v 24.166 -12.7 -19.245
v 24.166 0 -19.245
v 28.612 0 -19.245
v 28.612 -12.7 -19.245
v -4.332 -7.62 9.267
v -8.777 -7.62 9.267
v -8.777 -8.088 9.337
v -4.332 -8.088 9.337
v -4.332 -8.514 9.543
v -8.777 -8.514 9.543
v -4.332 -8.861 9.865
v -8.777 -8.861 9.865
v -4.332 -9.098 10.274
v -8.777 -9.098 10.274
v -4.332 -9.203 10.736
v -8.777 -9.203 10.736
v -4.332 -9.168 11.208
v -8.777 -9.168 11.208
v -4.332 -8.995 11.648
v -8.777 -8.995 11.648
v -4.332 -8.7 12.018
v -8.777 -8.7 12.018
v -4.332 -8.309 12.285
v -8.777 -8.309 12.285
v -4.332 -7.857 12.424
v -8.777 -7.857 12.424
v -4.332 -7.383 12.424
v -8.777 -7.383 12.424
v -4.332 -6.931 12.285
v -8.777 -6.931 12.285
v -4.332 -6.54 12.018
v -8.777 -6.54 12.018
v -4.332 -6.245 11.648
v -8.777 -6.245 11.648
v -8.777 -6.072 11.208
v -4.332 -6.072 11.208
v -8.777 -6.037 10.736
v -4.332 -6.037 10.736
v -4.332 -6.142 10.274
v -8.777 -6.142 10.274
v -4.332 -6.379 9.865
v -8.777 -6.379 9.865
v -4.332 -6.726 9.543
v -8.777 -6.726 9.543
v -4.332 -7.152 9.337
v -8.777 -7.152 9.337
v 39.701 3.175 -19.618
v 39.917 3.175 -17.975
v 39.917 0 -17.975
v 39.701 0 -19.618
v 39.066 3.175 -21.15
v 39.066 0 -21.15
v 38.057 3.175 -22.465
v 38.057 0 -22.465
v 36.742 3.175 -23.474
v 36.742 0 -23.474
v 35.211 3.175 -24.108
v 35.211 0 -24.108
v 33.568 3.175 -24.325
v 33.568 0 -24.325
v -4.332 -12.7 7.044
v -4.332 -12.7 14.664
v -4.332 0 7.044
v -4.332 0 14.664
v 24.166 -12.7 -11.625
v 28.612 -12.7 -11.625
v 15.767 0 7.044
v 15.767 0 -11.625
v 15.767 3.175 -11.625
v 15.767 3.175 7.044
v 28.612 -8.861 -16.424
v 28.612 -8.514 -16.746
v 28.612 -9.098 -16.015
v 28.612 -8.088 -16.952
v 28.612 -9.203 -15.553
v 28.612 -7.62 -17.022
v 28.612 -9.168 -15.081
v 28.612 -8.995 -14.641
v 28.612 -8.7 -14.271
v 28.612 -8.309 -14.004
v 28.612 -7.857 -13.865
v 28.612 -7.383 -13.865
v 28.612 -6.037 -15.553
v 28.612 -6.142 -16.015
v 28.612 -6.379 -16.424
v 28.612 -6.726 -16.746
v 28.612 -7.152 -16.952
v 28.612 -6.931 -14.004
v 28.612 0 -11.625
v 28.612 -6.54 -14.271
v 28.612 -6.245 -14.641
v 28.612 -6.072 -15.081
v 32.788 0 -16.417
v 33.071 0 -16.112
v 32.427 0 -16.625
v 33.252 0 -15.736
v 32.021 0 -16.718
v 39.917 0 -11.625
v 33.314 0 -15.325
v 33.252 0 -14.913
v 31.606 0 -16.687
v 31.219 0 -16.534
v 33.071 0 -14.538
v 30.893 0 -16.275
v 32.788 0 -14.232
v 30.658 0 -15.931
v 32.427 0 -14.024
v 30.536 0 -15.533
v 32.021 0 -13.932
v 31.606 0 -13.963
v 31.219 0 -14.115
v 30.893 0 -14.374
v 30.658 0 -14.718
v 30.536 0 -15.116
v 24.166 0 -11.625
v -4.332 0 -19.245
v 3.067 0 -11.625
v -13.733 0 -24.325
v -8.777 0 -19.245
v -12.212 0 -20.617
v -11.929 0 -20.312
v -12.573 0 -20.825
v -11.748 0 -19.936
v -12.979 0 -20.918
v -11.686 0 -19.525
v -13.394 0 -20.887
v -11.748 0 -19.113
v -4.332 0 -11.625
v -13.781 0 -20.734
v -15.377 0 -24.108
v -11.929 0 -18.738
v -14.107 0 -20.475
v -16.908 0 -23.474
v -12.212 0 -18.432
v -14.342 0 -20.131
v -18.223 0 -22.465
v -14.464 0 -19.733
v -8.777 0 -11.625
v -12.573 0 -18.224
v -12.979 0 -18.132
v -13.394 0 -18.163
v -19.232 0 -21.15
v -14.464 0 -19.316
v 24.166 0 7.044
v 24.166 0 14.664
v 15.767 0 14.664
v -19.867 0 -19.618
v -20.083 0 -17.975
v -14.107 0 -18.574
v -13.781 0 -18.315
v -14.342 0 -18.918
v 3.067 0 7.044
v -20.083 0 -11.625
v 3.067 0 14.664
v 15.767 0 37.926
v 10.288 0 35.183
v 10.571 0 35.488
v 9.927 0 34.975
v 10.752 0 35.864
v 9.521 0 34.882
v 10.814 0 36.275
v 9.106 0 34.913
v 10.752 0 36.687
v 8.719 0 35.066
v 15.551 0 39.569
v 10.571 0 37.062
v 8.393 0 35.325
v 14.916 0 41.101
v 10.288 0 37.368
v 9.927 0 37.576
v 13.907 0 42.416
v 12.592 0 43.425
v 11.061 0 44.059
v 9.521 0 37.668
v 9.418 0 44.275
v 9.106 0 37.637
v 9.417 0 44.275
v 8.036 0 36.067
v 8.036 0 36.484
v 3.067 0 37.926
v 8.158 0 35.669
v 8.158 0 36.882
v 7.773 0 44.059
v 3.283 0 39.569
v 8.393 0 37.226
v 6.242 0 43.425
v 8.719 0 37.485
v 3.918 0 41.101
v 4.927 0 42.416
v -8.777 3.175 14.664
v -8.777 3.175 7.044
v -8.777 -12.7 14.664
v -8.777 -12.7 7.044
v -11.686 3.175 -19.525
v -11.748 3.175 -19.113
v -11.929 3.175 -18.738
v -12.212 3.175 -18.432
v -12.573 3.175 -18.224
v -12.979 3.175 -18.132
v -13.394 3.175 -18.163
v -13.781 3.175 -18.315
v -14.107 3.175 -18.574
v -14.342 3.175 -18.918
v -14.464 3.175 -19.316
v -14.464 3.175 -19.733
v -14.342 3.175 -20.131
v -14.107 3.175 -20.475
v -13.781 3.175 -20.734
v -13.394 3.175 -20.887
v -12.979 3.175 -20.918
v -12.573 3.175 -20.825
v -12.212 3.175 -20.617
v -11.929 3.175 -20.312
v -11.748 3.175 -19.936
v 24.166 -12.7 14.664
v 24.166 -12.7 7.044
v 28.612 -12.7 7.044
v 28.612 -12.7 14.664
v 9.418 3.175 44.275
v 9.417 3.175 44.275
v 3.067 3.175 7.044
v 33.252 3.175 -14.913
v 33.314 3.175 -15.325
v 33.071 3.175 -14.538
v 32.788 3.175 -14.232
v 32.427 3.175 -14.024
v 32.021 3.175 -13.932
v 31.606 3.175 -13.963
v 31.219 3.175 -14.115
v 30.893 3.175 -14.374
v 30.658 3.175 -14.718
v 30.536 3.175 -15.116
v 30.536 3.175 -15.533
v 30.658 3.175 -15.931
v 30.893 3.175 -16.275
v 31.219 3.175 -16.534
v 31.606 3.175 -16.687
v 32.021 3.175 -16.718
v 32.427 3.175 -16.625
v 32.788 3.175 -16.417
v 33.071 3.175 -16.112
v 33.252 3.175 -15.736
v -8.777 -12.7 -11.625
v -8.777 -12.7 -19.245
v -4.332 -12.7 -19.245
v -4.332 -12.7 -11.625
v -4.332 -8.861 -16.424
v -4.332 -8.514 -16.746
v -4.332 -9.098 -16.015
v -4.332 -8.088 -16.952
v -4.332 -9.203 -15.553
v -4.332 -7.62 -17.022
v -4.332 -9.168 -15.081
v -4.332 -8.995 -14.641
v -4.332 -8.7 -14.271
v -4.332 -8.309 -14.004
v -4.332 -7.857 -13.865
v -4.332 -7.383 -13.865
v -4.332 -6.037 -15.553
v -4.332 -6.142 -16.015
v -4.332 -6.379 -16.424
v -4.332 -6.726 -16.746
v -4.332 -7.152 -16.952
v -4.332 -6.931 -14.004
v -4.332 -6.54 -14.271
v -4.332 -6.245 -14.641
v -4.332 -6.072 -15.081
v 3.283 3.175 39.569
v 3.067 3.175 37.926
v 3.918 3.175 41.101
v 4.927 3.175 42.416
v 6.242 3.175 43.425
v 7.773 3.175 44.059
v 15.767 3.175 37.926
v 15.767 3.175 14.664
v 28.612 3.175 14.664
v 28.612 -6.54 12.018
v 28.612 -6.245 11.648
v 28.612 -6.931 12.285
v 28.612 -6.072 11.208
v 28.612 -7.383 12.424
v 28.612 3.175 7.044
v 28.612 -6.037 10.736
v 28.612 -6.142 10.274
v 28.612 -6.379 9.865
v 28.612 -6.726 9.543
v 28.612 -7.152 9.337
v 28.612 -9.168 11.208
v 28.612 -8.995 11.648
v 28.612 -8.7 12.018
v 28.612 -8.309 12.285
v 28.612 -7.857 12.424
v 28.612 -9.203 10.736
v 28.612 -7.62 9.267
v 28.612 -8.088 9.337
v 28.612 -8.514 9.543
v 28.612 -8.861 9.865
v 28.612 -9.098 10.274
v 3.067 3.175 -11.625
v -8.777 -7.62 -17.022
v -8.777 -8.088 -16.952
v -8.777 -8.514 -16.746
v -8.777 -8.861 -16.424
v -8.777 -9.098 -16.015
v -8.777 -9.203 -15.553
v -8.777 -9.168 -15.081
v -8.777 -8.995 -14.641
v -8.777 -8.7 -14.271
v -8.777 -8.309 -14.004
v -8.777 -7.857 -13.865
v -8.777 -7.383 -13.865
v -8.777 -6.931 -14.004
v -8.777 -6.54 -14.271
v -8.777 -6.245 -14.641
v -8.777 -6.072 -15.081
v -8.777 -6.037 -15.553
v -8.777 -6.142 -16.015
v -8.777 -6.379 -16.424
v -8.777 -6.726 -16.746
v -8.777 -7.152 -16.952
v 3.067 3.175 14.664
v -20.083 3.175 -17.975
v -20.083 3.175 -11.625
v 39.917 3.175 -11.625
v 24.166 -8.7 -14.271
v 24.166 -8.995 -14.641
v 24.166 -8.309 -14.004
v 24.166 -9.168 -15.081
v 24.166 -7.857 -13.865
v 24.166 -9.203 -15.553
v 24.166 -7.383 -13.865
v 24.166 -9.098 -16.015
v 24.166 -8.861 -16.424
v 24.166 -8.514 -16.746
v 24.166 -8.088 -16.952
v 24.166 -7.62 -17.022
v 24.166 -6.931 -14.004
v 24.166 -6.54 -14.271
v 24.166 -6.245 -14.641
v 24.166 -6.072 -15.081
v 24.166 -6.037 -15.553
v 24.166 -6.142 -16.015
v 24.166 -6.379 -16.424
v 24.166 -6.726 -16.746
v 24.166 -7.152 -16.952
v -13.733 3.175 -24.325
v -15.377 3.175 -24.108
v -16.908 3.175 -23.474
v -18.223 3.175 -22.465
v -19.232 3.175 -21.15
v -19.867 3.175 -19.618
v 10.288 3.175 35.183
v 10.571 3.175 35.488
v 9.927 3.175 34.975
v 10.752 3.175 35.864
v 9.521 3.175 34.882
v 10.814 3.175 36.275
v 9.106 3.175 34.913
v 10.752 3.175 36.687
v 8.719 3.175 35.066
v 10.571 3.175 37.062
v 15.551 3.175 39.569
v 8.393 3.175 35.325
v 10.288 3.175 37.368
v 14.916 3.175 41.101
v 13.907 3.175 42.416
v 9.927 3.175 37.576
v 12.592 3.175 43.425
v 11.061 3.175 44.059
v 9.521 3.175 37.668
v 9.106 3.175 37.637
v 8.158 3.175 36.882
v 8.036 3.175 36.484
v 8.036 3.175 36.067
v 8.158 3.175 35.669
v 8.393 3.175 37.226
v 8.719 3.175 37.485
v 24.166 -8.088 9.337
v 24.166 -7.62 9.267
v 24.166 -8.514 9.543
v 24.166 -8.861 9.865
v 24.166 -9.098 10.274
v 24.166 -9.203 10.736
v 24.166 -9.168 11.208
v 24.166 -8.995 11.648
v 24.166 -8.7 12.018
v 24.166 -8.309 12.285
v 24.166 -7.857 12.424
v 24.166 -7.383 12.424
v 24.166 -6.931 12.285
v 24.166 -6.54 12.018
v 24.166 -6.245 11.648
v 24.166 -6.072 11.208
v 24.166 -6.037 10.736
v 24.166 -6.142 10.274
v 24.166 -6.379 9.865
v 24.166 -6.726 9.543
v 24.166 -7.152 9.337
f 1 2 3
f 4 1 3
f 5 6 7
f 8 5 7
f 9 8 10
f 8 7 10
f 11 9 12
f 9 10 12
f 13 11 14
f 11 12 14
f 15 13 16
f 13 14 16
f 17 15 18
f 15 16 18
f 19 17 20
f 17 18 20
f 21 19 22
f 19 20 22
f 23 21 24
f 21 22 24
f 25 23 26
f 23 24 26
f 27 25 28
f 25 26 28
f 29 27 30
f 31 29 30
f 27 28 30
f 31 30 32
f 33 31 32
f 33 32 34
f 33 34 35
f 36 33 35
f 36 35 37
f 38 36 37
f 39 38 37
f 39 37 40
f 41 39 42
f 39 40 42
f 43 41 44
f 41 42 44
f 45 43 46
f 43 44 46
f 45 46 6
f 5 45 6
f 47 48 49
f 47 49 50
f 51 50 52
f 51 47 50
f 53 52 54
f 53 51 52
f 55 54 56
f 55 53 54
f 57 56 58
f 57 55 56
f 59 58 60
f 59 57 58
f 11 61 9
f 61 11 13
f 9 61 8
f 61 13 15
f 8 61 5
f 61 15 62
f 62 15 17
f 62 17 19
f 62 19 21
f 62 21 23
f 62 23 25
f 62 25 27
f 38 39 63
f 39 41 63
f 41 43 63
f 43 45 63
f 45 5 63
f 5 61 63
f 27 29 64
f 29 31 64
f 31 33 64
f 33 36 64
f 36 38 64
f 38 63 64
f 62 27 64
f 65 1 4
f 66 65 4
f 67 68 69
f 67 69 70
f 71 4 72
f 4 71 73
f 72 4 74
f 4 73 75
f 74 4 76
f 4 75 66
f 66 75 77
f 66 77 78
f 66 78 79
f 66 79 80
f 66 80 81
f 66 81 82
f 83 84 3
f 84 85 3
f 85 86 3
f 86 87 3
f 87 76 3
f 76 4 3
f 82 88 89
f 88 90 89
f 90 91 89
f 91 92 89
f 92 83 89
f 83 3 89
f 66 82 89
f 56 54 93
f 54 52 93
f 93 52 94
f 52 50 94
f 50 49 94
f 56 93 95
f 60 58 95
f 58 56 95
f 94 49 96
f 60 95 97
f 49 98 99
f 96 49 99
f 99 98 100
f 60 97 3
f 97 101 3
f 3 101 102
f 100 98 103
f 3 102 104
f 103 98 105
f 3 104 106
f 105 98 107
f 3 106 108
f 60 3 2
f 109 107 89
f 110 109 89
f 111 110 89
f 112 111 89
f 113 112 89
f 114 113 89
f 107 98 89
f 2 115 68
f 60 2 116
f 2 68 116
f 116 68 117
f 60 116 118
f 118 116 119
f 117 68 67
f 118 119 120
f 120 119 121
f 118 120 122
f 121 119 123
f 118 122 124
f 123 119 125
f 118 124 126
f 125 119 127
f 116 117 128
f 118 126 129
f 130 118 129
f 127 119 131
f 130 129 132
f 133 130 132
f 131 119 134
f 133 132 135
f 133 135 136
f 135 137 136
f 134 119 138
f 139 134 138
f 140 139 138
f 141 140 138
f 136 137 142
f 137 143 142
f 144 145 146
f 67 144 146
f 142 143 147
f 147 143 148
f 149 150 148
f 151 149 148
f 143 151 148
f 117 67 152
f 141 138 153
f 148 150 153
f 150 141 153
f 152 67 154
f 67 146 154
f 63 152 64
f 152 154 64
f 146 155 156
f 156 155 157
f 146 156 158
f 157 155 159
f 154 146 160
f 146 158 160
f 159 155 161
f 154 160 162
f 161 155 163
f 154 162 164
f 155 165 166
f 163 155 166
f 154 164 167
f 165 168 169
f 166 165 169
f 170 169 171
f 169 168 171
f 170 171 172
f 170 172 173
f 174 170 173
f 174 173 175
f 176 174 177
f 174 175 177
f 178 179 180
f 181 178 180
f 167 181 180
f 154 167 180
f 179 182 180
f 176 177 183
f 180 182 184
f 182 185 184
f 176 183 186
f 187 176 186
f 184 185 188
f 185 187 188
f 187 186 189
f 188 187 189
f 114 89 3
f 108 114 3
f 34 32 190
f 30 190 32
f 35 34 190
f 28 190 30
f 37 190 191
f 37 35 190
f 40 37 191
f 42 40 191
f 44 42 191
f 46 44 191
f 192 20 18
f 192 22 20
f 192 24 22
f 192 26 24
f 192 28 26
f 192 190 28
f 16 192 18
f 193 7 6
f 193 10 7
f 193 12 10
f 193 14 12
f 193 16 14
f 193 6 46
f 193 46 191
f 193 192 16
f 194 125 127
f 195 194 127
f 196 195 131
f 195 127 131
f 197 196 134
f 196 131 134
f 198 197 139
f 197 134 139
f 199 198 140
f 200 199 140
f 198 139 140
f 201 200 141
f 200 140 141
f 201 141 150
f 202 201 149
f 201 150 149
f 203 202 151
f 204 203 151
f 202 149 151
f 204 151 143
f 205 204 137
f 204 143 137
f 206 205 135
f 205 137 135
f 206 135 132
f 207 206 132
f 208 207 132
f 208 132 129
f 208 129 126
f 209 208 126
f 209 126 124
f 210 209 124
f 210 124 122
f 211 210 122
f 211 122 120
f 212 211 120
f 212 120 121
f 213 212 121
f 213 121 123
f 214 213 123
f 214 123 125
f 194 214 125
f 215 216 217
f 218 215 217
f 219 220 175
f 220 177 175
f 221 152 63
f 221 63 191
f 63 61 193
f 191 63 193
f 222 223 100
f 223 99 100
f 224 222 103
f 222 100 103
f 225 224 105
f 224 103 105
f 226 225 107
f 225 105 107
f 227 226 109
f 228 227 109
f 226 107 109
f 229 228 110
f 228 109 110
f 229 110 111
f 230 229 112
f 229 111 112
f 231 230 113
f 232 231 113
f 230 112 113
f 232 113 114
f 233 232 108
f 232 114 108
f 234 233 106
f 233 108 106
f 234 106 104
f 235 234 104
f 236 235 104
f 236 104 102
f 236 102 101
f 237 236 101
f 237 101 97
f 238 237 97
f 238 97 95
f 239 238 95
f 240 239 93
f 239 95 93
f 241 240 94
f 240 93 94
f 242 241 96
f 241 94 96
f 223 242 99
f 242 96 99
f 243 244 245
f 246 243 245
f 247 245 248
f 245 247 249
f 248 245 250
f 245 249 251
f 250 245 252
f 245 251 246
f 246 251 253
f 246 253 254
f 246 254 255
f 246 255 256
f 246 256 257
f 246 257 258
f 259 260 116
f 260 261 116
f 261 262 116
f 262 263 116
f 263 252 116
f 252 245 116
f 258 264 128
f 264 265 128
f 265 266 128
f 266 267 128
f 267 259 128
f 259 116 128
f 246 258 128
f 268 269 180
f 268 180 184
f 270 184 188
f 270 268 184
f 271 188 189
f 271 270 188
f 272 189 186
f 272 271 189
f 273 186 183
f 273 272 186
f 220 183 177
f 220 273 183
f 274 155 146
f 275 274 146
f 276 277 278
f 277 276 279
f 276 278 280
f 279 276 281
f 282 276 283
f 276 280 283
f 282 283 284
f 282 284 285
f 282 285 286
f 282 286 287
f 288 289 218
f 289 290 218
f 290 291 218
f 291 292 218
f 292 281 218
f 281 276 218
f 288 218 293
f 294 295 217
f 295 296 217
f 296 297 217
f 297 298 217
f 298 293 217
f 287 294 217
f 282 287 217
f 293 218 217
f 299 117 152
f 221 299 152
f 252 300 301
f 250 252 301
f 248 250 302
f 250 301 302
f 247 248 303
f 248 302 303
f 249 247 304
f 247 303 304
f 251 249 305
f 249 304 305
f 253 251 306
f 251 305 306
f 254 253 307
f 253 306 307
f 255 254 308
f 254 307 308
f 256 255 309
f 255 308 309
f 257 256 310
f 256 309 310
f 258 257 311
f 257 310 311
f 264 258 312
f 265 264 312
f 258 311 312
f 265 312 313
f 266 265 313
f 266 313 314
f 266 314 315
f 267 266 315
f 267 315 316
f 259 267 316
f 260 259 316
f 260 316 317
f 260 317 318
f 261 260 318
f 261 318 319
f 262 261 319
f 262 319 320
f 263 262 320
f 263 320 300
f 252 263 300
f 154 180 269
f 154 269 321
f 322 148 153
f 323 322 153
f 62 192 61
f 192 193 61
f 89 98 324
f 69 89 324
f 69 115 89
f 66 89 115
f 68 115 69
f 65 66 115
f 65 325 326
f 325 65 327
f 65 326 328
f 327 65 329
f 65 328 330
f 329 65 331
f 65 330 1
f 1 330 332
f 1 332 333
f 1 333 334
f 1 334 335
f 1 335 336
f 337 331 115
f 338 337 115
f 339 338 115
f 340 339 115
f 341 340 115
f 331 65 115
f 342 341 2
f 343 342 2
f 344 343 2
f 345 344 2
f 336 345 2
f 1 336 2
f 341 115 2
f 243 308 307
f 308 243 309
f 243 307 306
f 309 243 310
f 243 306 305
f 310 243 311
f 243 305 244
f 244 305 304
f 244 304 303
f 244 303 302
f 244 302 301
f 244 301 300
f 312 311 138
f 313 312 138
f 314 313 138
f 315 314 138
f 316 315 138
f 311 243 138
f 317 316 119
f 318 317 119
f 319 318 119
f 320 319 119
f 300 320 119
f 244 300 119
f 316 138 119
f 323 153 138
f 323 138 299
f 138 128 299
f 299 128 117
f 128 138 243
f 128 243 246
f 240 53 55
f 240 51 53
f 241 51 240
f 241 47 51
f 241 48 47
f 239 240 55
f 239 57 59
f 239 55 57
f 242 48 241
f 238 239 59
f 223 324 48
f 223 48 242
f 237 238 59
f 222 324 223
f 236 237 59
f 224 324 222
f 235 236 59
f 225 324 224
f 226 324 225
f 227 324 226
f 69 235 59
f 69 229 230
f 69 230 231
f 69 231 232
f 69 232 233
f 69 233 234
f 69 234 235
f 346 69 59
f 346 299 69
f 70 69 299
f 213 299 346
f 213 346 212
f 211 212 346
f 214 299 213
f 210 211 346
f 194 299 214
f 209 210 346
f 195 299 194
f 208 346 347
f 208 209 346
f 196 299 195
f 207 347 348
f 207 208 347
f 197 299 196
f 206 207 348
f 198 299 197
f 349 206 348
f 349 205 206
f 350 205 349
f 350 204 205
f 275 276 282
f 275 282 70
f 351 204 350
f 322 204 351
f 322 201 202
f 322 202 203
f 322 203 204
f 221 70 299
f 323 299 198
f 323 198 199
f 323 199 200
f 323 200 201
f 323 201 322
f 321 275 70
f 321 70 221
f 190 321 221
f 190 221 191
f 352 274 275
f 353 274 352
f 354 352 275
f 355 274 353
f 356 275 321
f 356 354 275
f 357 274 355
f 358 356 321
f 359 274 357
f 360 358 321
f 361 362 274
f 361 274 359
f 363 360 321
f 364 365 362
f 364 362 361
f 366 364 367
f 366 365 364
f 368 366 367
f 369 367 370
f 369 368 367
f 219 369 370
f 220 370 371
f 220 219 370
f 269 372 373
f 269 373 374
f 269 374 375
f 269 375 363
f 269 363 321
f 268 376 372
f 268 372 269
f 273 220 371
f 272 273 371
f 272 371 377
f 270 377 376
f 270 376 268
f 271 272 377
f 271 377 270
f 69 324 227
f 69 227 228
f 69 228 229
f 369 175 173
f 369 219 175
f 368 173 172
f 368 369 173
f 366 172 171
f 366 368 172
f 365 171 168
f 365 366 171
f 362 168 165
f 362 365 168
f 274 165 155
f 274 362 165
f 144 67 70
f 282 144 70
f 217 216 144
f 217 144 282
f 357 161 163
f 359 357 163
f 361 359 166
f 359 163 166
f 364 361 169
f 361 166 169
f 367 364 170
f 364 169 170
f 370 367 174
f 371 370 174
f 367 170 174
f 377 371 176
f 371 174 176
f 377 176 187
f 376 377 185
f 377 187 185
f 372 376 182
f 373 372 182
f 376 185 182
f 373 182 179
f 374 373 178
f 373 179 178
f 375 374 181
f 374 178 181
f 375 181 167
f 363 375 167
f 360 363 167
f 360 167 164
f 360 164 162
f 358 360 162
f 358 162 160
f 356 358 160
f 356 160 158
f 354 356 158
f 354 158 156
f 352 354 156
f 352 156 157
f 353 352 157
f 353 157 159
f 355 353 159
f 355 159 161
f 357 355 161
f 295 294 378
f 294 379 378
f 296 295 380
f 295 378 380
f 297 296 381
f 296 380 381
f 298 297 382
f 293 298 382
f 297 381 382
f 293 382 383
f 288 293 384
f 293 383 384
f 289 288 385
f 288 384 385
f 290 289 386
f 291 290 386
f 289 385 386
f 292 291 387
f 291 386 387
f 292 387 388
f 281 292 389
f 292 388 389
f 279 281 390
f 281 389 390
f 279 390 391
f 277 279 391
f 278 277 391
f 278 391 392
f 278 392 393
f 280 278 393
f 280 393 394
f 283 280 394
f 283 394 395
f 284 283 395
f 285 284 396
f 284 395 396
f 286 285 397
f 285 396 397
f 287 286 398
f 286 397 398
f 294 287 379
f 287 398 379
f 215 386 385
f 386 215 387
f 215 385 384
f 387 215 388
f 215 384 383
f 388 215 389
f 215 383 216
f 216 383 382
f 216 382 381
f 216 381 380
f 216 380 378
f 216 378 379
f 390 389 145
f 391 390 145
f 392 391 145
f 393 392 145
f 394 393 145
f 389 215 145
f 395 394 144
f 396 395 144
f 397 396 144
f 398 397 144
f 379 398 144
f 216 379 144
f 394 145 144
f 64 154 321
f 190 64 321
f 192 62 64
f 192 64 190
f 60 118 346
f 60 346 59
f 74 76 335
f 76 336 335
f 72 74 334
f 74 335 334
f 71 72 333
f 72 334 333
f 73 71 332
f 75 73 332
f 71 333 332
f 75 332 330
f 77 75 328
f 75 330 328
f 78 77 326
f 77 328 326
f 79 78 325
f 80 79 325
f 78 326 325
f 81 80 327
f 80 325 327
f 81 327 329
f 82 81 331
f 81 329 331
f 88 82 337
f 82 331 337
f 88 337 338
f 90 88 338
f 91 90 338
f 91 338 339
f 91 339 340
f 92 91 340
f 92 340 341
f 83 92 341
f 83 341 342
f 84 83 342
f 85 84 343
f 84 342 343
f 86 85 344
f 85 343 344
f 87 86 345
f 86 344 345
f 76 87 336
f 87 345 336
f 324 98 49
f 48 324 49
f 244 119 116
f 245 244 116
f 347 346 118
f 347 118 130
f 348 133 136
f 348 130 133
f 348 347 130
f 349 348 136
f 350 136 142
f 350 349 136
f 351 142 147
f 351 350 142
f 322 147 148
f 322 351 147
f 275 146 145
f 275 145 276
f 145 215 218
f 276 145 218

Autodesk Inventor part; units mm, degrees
ref_plane "YZ Plane" through (0, 0, 0) normal (1, 0, 0) x (0, 1, 0)
ref_plane "XZ Plane" through (0, 0, 0) normal (0, 1, 0) x (-1, 0, 0)
ref_plane "XY Plane" through (0, 0, 0) normal (0, 0, 1) x (1, 0, 0)
sketch "Sketch1" plane through (0, 0, 0) normal (0, 1, 0) x (-1, 0, 0)
  line L0 (20.0829, 44.2754) -> (-39.9171, 44.2754)
  line L1 (-39.9171, 44.2754) -> (-39.9171, -37.0246)
  line L2 (-39.9171, -37.0246) -> (20.0829, -37.0246)
  line L3 (20.0829, -37.0246) -> (20.0829, 44.2754)
  point P0 (0, 0)
  dimension "d0" = 60
  dimension "d1" = 81.3
extrude "Extrusion1" add sketch "Sketch1" along normal blind 3.175
sketch "Sketch8" plane through (0, 0, 0) normal (0, -1, 0) x (1, 0, 0)
  circle A0 centre (9.4171, 36.2754) radius 1.397
  circle A1 centre (-13.0829, -19.5246) radius 1.397
  circle A2 centre (31.9171, -15.3246) radius 1.397
  line L0 (39.9171, 44.2754) -> (39.9171, -37.0246) projected
  line L1 (39.9171, -37.0246) -> (-20.0829, -37.0246) projected
  point P0 (0, 0)
  point P1 (39.9171, 42.2754)
  point P2 (39.9171, -35.0246)
  point P3 (37.9171, -37.0246)
  point P4 (-18.0829, -37.0246)
  dimension "d76" = 8
  dimension "d77" = 21.7
  dimension "d78" = 4.2
  dimension "d79" = 45
  dimension "d80" = 22.5
  dimension "d81" = 51.6
  dimension "d97" = 2.794
extrude "Extrusion6" cut sketch "Sketch8" against normal blind 4
sketch "Sketch9" plane through (0, 0, 0) normal (0, -1, 0) x (1, 0, 0)
  line L0 (39.9171, -37.0246) -> (-20.0829, -37.0246) projected
  line L1 (-20.0829, -24.3246) -> (39.9171, -24.3246)
  line L2 (39.9171, -24.3246) -> (39.9171, -37.0246)
  line L3 (39.9171, -37.0246) -> (-20.0829, -37.0246)
  line L4 (-20.0829, -37.0246) -> (-20.0829, -24.3246)
  line L5 (39.9171, 44.2754) -> (39.9171, -37.0246) projected
  line L6 (39.9171, -11.6246) -> (15.7671, -11.6246)
  line L7 (15.7671, -11.6246) -> (15.7671, 7.0444)
  line L8 (15.7671, 7.0444) -> (39.9171, 7.0444)
  line L9 (39.9171, 7.0444) -> (39.9171, -11.6246)
  line L10 (-20.0829, -11.6246) -> (3.0671, -11.6246)
  line L11 (3.0671, -11.6246) -> (3.0671, 7.0444)
  line L12 (3.0671, 7.0444) -> (-20.0829, 7.0444)
  line L13 (-20.0829, 7.0444) -> (-20.0829, -11.6246)
  circle A0 centre (9.4171, 36.2754) radius 1.397 construction
  line L14 (9.4171, 36.2754) -> (9.4171, 34.8784) construction
  line L15 (-20.0829, 44.2754) -> (39.9171, 44.2754) construction
  line L16 (-20.0829, -37.0246) -> (-20.0829, 44.2754) projected
  line L17 (-20.0829, -37.0246) -> (-20.0829, 44.2754) projected
  line L18 (-20.0829, 44.2754) -> (3.0671, 44.2754)
  line L19 (3.0671, 44.2754) -> (3.0671, 14.6644)
  line L20 (3.0671, 14.6644) -> (-20.0829, 14.6644)
  line L21 (-20.0829, 14.6644) -> (-20.0829, 44.2754)
  line L22 (-20.0829, 44.2754) -> (39.9171, 44.2754) projected
  line L23 (15.7671, 14.6644) -> (39.9171, 14.6644)
  line L24 (39.9171, 14.6644) -> (39.9171, 44.2754)
  line L25 (39.9171, 44.2754) -> (15.7671, 44.2754)
  line L26 (15.7671, 44.2754) -> (15.7671, 14.6644)
  line L27 (-20.0829, 14.6644) -> (-8.7773, 14.6644)
  line L28 (-8.7773, 14.6644) -> (-8.7773, 7.0444)
  line L29 (-8.7773, 7.0444) -> (-20.0829, 7.0444)
  line L30 (-20.0829, 7.0444) -> (-20.0829, 14.6644)
  line L31 (39.9171, 14.6644) -> (28.6115, 14.6644)
  line L32 (28.6115, 14.6644) -> (28.6115, 7.0444)
  line L33 (28.6115, 7.0444) -> (39.9171, 7.0444)
  line L34 (39.9171, 7.0444) -> (39.9171, 14.6644)
  line L35 (9.9171, 44.2754) -> (9.9171, -37.0246) construction
  point P0 (0, 0)
  point P1 (3.0671, -2.2901)
  point P2 (39.9171, 7.0444)
  point P3 (-8.7773, 14.6644)
  point P4 (28.6115, 14.6644)
  dimension "d98" = 12.7
  dimension "d99" = 12.7
  dimension "d100" = 12.7
  dimension "d142" = 18.669
  dimension "d143" = 7.62
  dimension "d144" = 37.3888
sketch "Sketch11" plane through (0, 3.175, 0) normal (0, 1, 0) x (1, 0, 0)
  line L0 (3.0671, 11.6246) -> (-20.0829, 11.6246) projected
  line L1 (-8.7773, 19.2446) -> (-4.3323, 19.2446)
  line L2 (-4.3323, 19.2446) -> (-4.3323, 11.6246)
  line L3 (-4.3323, 11.6246) -> (-8.7773, 11.6246)
  line L4 (-8.7773, 11.6246) -> (-8.7773, 19.2446)
  line L5 (39.9171, 11.6246) -> (15.7671, 11.6246) projected
  line L6 (24.1665, 19.2446) -> (28.6115, 19.2446)
  line L7 (28.6115, 19.2446) -> (28.6115, 11.6246)
  line L8 (28.6115, 11.6246) -> (24.1665, 11.6246)
  line L9 (24.1665, 11.6246) -> (24.1665, 19.2446)
  line L10 (39.9171, 24.3246) -> (-20.0829, 24.3246) construction
  line L11 (9.9171, 24.3246) -> (9.9171, -44.2754) construction
  line L12 (-20.0829, -44.2754) -> (39.9171, -44.2754) construction
  point P0 (0, 0)
  dimension "d115" = 28.4988
  dimension "d116" = 7.62
  dimension "d117" = 4.445
extrude "Extrusion9" add sketch "Sketch11" against normal blind 15.875
sketch "Sketch12" plane through (28.6115, 3.175, -11.6246) normal (1, 0, 0) x (0, 0, 1)
  line L0 (-7.62, 15.875) -> (0, 15.875) projected
  line L1 (-7.62, 3.175) -> (-7.62, 15.875) projected
  point P0 (11.6246, 3.175)
  point P1 (-3.81, 10.795)
  point P2 (7.62, 0)
  dimension "d130" = 5.08
  dimension "d148" = 3.81
hole "Hole1" at (28.6115, -7.62, -15.4346) direction (-1, 0, 0) diameter 3.175 depth 37.3888
pattern_linear "Rectangular Pattern1" count 2 spacing 26.289 along (0, 0, 1) of "Extrusion9", "Hole1"
extrude "Extrusion10" cut sketch "Sketch9" against normal blind 25.4 contours L0 L4 L1 L2 | L6 L7 L8 L5 | L13 L12 L11 L10 | L8 L32 L23 L5 | L16 L20 L28 L12 | L23 L26 L22 L5 | L16 L18 L19 L20
fillet "Fillet2" radius 6.35 4 edges at (3.0671, 1.5875, 44.2754) (15.7671, 1.5875, 44.2754) (-20.0829, 1.5875, -24.3246) (39.9171, 1.5875, -24.3246)
properties part number "TALLER_SkyhopperMount"
